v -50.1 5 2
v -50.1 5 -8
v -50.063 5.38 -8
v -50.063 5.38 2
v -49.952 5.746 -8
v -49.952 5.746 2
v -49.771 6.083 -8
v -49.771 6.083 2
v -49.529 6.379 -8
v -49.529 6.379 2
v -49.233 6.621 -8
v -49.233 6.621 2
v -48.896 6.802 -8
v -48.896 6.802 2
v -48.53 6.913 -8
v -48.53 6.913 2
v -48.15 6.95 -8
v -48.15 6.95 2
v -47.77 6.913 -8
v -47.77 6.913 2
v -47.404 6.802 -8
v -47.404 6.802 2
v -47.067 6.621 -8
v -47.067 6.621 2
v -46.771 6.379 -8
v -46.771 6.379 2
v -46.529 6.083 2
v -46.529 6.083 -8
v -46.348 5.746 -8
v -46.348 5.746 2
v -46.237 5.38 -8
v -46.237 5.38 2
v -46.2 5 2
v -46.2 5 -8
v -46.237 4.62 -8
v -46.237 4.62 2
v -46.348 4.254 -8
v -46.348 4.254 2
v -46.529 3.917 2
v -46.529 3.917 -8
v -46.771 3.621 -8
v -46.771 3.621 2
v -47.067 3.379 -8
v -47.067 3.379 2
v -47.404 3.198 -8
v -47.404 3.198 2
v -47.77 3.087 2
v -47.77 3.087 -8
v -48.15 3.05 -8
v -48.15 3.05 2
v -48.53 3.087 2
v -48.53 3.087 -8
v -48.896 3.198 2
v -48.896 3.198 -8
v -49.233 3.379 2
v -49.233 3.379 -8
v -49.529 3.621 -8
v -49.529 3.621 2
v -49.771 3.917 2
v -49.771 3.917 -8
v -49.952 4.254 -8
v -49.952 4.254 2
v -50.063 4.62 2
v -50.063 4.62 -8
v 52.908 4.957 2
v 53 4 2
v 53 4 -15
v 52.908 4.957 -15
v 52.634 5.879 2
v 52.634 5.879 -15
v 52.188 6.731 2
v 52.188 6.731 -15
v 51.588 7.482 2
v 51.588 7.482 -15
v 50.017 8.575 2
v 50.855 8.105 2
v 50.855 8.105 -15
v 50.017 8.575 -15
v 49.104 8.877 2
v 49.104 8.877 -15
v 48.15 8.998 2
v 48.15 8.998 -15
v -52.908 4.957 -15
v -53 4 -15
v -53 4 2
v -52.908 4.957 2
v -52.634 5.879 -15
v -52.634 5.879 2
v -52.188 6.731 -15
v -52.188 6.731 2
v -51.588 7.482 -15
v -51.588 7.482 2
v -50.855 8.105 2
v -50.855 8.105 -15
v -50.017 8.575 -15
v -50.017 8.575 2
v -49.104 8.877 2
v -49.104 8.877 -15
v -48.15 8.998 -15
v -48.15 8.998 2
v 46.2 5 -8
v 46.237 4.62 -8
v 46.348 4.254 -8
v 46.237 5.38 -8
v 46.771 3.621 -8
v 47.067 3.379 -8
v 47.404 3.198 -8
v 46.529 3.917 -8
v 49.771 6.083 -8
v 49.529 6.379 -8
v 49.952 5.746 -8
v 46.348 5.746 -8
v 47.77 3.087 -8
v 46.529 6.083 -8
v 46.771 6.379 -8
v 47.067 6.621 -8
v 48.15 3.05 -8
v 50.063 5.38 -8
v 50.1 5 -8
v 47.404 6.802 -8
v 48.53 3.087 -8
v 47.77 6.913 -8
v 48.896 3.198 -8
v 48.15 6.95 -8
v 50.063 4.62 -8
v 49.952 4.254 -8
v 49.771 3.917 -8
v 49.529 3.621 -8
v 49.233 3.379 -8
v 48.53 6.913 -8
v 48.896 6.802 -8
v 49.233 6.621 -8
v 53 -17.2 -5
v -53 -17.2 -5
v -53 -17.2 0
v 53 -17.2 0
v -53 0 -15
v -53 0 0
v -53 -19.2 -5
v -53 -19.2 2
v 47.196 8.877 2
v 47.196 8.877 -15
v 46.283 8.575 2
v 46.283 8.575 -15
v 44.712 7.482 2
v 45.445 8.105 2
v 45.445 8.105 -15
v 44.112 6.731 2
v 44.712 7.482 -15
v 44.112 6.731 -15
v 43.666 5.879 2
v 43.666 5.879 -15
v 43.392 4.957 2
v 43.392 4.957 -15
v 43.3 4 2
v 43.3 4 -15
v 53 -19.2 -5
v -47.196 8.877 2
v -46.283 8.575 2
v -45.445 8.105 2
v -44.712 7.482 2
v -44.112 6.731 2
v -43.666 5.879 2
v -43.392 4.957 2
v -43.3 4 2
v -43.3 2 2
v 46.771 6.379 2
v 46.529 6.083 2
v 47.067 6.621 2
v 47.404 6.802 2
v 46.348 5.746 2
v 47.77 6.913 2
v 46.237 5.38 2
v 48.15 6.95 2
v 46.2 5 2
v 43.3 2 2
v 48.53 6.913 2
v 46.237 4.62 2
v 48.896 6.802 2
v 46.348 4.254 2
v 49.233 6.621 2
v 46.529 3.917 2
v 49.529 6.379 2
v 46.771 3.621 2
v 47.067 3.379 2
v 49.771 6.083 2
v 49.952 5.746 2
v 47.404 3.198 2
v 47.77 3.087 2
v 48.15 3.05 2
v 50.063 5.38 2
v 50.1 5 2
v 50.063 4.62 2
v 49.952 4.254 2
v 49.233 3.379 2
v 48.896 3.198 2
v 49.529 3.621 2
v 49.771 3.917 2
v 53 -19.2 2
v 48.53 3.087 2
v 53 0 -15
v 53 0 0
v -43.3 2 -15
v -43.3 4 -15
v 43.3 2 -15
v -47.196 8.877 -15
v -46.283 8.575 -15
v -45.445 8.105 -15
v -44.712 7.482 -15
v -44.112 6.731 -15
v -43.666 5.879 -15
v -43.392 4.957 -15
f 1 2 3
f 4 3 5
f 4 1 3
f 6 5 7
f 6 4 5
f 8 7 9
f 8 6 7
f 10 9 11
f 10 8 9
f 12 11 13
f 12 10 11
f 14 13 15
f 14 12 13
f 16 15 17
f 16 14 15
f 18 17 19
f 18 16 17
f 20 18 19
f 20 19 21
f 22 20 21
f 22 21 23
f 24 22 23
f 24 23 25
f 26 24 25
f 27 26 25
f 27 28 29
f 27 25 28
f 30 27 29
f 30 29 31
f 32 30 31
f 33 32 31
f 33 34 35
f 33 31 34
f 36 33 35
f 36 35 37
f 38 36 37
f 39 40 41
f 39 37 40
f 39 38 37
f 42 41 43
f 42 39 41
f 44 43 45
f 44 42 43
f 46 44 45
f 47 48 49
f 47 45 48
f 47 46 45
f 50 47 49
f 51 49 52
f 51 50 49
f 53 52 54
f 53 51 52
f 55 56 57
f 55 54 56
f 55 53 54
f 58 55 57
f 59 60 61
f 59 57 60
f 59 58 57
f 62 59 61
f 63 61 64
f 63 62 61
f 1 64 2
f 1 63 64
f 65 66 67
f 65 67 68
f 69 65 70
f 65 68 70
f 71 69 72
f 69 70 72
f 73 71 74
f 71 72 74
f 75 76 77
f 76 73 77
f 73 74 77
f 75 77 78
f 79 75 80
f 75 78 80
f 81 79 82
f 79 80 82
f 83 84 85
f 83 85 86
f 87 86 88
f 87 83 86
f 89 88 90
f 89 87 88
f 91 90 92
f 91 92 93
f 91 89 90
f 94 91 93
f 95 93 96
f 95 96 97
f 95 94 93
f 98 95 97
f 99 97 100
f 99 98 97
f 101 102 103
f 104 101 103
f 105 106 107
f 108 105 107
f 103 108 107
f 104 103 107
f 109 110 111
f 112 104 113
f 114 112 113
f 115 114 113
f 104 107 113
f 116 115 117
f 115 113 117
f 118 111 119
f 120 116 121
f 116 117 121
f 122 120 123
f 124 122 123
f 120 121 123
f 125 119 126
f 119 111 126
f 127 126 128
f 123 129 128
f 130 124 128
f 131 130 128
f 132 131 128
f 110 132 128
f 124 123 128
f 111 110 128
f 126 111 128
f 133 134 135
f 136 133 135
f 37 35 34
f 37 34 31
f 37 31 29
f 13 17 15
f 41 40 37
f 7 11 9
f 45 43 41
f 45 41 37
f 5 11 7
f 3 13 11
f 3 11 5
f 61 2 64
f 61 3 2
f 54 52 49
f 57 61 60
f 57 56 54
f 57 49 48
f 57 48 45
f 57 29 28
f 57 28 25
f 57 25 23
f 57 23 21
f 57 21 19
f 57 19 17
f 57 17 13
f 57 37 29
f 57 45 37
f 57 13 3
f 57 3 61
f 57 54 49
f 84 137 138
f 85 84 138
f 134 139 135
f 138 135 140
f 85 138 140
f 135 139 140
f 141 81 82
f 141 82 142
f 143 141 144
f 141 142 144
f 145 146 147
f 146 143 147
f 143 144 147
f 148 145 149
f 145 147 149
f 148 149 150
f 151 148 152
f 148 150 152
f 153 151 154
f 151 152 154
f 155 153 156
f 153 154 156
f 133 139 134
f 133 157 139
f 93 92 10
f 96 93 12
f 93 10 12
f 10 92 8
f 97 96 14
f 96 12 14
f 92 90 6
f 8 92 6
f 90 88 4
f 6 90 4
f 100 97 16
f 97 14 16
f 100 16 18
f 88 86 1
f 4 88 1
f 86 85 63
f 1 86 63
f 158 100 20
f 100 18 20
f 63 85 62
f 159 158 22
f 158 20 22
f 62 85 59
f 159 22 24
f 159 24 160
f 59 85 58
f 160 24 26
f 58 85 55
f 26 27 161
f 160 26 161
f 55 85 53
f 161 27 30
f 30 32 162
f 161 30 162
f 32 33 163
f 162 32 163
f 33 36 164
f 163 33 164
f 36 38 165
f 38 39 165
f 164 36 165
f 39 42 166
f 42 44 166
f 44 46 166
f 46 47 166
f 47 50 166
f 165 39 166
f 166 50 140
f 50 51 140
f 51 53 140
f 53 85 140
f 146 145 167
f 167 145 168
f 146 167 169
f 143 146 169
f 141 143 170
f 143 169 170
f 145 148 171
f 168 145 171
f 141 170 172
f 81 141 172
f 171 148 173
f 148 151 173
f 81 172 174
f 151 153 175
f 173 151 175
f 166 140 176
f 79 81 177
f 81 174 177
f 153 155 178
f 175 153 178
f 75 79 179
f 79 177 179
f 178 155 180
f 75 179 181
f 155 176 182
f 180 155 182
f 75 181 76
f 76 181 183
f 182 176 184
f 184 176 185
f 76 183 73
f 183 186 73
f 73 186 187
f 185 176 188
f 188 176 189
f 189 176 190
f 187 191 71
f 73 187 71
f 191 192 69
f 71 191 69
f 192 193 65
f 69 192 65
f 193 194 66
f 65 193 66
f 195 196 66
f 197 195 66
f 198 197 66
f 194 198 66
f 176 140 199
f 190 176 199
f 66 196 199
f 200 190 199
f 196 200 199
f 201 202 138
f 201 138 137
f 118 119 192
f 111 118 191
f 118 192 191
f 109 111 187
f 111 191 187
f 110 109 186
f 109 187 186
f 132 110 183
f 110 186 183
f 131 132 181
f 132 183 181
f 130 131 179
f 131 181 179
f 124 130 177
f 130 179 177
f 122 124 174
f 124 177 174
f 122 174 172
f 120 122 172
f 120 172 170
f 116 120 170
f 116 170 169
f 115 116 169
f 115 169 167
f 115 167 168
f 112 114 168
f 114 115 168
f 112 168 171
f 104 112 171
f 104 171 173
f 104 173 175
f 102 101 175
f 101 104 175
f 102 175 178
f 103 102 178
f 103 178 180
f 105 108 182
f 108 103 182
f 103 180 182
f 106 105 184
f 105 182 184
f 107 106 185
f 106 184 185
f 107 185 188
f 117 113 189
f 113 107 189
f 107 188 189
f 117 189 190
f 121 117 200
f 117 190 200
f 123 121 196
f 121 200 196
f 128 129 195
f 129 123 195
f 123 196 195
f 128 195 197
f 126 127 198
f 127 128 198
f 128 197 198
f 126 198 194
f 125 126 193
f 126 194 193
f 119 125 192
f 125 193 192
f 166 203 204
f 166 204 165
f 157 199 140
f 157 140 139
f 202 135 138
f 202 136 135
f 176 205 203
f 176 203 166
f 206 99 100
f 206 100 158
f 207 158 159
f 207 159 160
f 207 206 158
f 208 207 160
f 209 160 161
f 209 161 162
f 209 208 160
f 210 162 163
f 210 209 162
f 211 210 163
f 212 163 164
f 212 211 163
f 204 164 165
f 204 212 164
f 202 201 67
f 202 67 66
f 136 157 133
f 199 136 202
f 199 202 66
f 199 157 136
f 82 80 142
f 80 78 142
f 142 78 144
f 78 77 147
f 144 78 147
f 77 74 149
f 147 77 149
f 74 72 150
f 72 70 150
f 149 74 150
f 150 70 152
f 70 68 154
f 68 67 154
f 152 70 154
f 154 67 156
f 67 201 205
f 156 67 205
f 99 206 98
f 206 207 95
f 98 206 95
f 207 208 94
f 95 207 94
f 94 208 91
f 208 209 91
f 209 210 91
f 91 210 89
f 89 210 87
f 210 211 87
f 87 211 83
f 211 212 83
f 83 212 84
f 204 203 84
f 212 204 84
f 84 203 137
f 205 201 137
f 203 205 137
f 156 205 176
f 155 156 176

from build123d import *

# Parameters (mm, degrees)
F1_DEPTH    = 53
F2_W        = 9.7
F2_H        = 17
F3_DEPTH    = 7
F4_R        = 1.95
F5_DEPTH    = 25
F6_T1_DEPTH = 42
F7_R        = 1.95
F8_DEPTH    = 7


# Not quite as in the source:
# - a fillet or chamfer that OpenCascade refuses, or shapes differently, is made with other operations: its cross-section is extruded or revolved along the edge and cut away or added
# - a pattern or mirror of a feature is missing from the dataset's text; its kind, count and spacing are read off the source's solid


with BuildPart() as f1:
    # F0 (on Right) → F1 (new body, symmetric)
    with BuildSketch(Plane.YZ):
        Polygon((-17.2, 0), (0, 0), (0, -15), (2, -15), (2, 2), (-19.2, 2), (-19.2, -5), (-17.2, -5), align=None)
    extrude(amount=F1_DEPTH, both=True)

    # F2 (on face) → F3 (join)
    with BuildSketch(Plane(origin=(0, 2, 0), x_dir=(-1, 0, 0), z_dir=(0, 1, 0))):
        with Locations((-48.15, -6.5)):
            Rectangle(F2_W, F2_H)
    f3 = extrude(amount=F3_DEPTH)

    # F3_copies: F3 across plane
    add(f3.mirror(Plane(origin=(0, 0, 0), x_dir=(0, 0, -1), z_dir=(-1, 0, 0))))

    # F4 (on face) → F5 (cut)
    with BuildSketch(Plane.XY.offset(2)):
        with Locations((48.15, 5)):
            Circle(F4_R)
    f5 = extrude(amount=-F5_DEPTH, mode=Mode.SUBTRACT)

    # F5_copies: F5 across plane
    add(f5.mirror(Plane(origin=(0, 0, 0), x_dir=(0, 0, -1), z_dir=(-1, 0, 0))), mode=Mode.SUBTRACT)

    # F6: fillet of radius 5 on 4 edges, made by hand

    # F6_s2 → F6_t1 (cut)
    with BuildSketch(Plane.XY.offset(-27.5)):
        with BuildLine():
            ThreePointArc((53, 4), (51.5355339059, 7.5355339059), (48, 9))
            Line((48, 9), (53, 9))
            Line((53, 9), (53, 4))
        make_face()
        with BuildLine():
            ThreePointArc((48.3, 9), (44.7644660941, 7.5355339059), (43.3, 4))
            Line((43.3, 4), (43.3, 9))
            Line((43.3, 9), (48.3, 9))
        make_face()
        with BuildLine():
            ThreePointArc((-53, 4), (-51.5355339059, 7.5355339059), (-48, 9))
            Line((-48, 9), (-53, 9))
            Line((-53, 9), (-53, 4))
        make_face()
        with BuildLine():
            ThreePointArc((-48.3, 9), (-44.7644660941, 7.5355339059), (-43.3, 4))
            Line((-43.3, 4), (-43.3, 9))
            Line((-43.3, 9), (-48.3, 9))
        make_face()
    extrude(amount=F6_T1_DEPTH, mode=Mode.SUBTRACT)

    # F7 (on face) → F8 (join)
    with BuildSketch(Plane(origin=(0, 0, -15), x_dir=(1, 0, 0), z_dir=(0, 0, -1))):
        with Locations((48.15, -5)):
            Circle(F7_R)
    f8 = extrude(amount=-F8_DEPTH)

    # F8_copies: F8 across plane
    add(f8.mirror(Plane(origin=(0, 0, 0), x_dir=(0, 0, -1), z_dir=(-1, 0, 0))))


solid = f1.part
